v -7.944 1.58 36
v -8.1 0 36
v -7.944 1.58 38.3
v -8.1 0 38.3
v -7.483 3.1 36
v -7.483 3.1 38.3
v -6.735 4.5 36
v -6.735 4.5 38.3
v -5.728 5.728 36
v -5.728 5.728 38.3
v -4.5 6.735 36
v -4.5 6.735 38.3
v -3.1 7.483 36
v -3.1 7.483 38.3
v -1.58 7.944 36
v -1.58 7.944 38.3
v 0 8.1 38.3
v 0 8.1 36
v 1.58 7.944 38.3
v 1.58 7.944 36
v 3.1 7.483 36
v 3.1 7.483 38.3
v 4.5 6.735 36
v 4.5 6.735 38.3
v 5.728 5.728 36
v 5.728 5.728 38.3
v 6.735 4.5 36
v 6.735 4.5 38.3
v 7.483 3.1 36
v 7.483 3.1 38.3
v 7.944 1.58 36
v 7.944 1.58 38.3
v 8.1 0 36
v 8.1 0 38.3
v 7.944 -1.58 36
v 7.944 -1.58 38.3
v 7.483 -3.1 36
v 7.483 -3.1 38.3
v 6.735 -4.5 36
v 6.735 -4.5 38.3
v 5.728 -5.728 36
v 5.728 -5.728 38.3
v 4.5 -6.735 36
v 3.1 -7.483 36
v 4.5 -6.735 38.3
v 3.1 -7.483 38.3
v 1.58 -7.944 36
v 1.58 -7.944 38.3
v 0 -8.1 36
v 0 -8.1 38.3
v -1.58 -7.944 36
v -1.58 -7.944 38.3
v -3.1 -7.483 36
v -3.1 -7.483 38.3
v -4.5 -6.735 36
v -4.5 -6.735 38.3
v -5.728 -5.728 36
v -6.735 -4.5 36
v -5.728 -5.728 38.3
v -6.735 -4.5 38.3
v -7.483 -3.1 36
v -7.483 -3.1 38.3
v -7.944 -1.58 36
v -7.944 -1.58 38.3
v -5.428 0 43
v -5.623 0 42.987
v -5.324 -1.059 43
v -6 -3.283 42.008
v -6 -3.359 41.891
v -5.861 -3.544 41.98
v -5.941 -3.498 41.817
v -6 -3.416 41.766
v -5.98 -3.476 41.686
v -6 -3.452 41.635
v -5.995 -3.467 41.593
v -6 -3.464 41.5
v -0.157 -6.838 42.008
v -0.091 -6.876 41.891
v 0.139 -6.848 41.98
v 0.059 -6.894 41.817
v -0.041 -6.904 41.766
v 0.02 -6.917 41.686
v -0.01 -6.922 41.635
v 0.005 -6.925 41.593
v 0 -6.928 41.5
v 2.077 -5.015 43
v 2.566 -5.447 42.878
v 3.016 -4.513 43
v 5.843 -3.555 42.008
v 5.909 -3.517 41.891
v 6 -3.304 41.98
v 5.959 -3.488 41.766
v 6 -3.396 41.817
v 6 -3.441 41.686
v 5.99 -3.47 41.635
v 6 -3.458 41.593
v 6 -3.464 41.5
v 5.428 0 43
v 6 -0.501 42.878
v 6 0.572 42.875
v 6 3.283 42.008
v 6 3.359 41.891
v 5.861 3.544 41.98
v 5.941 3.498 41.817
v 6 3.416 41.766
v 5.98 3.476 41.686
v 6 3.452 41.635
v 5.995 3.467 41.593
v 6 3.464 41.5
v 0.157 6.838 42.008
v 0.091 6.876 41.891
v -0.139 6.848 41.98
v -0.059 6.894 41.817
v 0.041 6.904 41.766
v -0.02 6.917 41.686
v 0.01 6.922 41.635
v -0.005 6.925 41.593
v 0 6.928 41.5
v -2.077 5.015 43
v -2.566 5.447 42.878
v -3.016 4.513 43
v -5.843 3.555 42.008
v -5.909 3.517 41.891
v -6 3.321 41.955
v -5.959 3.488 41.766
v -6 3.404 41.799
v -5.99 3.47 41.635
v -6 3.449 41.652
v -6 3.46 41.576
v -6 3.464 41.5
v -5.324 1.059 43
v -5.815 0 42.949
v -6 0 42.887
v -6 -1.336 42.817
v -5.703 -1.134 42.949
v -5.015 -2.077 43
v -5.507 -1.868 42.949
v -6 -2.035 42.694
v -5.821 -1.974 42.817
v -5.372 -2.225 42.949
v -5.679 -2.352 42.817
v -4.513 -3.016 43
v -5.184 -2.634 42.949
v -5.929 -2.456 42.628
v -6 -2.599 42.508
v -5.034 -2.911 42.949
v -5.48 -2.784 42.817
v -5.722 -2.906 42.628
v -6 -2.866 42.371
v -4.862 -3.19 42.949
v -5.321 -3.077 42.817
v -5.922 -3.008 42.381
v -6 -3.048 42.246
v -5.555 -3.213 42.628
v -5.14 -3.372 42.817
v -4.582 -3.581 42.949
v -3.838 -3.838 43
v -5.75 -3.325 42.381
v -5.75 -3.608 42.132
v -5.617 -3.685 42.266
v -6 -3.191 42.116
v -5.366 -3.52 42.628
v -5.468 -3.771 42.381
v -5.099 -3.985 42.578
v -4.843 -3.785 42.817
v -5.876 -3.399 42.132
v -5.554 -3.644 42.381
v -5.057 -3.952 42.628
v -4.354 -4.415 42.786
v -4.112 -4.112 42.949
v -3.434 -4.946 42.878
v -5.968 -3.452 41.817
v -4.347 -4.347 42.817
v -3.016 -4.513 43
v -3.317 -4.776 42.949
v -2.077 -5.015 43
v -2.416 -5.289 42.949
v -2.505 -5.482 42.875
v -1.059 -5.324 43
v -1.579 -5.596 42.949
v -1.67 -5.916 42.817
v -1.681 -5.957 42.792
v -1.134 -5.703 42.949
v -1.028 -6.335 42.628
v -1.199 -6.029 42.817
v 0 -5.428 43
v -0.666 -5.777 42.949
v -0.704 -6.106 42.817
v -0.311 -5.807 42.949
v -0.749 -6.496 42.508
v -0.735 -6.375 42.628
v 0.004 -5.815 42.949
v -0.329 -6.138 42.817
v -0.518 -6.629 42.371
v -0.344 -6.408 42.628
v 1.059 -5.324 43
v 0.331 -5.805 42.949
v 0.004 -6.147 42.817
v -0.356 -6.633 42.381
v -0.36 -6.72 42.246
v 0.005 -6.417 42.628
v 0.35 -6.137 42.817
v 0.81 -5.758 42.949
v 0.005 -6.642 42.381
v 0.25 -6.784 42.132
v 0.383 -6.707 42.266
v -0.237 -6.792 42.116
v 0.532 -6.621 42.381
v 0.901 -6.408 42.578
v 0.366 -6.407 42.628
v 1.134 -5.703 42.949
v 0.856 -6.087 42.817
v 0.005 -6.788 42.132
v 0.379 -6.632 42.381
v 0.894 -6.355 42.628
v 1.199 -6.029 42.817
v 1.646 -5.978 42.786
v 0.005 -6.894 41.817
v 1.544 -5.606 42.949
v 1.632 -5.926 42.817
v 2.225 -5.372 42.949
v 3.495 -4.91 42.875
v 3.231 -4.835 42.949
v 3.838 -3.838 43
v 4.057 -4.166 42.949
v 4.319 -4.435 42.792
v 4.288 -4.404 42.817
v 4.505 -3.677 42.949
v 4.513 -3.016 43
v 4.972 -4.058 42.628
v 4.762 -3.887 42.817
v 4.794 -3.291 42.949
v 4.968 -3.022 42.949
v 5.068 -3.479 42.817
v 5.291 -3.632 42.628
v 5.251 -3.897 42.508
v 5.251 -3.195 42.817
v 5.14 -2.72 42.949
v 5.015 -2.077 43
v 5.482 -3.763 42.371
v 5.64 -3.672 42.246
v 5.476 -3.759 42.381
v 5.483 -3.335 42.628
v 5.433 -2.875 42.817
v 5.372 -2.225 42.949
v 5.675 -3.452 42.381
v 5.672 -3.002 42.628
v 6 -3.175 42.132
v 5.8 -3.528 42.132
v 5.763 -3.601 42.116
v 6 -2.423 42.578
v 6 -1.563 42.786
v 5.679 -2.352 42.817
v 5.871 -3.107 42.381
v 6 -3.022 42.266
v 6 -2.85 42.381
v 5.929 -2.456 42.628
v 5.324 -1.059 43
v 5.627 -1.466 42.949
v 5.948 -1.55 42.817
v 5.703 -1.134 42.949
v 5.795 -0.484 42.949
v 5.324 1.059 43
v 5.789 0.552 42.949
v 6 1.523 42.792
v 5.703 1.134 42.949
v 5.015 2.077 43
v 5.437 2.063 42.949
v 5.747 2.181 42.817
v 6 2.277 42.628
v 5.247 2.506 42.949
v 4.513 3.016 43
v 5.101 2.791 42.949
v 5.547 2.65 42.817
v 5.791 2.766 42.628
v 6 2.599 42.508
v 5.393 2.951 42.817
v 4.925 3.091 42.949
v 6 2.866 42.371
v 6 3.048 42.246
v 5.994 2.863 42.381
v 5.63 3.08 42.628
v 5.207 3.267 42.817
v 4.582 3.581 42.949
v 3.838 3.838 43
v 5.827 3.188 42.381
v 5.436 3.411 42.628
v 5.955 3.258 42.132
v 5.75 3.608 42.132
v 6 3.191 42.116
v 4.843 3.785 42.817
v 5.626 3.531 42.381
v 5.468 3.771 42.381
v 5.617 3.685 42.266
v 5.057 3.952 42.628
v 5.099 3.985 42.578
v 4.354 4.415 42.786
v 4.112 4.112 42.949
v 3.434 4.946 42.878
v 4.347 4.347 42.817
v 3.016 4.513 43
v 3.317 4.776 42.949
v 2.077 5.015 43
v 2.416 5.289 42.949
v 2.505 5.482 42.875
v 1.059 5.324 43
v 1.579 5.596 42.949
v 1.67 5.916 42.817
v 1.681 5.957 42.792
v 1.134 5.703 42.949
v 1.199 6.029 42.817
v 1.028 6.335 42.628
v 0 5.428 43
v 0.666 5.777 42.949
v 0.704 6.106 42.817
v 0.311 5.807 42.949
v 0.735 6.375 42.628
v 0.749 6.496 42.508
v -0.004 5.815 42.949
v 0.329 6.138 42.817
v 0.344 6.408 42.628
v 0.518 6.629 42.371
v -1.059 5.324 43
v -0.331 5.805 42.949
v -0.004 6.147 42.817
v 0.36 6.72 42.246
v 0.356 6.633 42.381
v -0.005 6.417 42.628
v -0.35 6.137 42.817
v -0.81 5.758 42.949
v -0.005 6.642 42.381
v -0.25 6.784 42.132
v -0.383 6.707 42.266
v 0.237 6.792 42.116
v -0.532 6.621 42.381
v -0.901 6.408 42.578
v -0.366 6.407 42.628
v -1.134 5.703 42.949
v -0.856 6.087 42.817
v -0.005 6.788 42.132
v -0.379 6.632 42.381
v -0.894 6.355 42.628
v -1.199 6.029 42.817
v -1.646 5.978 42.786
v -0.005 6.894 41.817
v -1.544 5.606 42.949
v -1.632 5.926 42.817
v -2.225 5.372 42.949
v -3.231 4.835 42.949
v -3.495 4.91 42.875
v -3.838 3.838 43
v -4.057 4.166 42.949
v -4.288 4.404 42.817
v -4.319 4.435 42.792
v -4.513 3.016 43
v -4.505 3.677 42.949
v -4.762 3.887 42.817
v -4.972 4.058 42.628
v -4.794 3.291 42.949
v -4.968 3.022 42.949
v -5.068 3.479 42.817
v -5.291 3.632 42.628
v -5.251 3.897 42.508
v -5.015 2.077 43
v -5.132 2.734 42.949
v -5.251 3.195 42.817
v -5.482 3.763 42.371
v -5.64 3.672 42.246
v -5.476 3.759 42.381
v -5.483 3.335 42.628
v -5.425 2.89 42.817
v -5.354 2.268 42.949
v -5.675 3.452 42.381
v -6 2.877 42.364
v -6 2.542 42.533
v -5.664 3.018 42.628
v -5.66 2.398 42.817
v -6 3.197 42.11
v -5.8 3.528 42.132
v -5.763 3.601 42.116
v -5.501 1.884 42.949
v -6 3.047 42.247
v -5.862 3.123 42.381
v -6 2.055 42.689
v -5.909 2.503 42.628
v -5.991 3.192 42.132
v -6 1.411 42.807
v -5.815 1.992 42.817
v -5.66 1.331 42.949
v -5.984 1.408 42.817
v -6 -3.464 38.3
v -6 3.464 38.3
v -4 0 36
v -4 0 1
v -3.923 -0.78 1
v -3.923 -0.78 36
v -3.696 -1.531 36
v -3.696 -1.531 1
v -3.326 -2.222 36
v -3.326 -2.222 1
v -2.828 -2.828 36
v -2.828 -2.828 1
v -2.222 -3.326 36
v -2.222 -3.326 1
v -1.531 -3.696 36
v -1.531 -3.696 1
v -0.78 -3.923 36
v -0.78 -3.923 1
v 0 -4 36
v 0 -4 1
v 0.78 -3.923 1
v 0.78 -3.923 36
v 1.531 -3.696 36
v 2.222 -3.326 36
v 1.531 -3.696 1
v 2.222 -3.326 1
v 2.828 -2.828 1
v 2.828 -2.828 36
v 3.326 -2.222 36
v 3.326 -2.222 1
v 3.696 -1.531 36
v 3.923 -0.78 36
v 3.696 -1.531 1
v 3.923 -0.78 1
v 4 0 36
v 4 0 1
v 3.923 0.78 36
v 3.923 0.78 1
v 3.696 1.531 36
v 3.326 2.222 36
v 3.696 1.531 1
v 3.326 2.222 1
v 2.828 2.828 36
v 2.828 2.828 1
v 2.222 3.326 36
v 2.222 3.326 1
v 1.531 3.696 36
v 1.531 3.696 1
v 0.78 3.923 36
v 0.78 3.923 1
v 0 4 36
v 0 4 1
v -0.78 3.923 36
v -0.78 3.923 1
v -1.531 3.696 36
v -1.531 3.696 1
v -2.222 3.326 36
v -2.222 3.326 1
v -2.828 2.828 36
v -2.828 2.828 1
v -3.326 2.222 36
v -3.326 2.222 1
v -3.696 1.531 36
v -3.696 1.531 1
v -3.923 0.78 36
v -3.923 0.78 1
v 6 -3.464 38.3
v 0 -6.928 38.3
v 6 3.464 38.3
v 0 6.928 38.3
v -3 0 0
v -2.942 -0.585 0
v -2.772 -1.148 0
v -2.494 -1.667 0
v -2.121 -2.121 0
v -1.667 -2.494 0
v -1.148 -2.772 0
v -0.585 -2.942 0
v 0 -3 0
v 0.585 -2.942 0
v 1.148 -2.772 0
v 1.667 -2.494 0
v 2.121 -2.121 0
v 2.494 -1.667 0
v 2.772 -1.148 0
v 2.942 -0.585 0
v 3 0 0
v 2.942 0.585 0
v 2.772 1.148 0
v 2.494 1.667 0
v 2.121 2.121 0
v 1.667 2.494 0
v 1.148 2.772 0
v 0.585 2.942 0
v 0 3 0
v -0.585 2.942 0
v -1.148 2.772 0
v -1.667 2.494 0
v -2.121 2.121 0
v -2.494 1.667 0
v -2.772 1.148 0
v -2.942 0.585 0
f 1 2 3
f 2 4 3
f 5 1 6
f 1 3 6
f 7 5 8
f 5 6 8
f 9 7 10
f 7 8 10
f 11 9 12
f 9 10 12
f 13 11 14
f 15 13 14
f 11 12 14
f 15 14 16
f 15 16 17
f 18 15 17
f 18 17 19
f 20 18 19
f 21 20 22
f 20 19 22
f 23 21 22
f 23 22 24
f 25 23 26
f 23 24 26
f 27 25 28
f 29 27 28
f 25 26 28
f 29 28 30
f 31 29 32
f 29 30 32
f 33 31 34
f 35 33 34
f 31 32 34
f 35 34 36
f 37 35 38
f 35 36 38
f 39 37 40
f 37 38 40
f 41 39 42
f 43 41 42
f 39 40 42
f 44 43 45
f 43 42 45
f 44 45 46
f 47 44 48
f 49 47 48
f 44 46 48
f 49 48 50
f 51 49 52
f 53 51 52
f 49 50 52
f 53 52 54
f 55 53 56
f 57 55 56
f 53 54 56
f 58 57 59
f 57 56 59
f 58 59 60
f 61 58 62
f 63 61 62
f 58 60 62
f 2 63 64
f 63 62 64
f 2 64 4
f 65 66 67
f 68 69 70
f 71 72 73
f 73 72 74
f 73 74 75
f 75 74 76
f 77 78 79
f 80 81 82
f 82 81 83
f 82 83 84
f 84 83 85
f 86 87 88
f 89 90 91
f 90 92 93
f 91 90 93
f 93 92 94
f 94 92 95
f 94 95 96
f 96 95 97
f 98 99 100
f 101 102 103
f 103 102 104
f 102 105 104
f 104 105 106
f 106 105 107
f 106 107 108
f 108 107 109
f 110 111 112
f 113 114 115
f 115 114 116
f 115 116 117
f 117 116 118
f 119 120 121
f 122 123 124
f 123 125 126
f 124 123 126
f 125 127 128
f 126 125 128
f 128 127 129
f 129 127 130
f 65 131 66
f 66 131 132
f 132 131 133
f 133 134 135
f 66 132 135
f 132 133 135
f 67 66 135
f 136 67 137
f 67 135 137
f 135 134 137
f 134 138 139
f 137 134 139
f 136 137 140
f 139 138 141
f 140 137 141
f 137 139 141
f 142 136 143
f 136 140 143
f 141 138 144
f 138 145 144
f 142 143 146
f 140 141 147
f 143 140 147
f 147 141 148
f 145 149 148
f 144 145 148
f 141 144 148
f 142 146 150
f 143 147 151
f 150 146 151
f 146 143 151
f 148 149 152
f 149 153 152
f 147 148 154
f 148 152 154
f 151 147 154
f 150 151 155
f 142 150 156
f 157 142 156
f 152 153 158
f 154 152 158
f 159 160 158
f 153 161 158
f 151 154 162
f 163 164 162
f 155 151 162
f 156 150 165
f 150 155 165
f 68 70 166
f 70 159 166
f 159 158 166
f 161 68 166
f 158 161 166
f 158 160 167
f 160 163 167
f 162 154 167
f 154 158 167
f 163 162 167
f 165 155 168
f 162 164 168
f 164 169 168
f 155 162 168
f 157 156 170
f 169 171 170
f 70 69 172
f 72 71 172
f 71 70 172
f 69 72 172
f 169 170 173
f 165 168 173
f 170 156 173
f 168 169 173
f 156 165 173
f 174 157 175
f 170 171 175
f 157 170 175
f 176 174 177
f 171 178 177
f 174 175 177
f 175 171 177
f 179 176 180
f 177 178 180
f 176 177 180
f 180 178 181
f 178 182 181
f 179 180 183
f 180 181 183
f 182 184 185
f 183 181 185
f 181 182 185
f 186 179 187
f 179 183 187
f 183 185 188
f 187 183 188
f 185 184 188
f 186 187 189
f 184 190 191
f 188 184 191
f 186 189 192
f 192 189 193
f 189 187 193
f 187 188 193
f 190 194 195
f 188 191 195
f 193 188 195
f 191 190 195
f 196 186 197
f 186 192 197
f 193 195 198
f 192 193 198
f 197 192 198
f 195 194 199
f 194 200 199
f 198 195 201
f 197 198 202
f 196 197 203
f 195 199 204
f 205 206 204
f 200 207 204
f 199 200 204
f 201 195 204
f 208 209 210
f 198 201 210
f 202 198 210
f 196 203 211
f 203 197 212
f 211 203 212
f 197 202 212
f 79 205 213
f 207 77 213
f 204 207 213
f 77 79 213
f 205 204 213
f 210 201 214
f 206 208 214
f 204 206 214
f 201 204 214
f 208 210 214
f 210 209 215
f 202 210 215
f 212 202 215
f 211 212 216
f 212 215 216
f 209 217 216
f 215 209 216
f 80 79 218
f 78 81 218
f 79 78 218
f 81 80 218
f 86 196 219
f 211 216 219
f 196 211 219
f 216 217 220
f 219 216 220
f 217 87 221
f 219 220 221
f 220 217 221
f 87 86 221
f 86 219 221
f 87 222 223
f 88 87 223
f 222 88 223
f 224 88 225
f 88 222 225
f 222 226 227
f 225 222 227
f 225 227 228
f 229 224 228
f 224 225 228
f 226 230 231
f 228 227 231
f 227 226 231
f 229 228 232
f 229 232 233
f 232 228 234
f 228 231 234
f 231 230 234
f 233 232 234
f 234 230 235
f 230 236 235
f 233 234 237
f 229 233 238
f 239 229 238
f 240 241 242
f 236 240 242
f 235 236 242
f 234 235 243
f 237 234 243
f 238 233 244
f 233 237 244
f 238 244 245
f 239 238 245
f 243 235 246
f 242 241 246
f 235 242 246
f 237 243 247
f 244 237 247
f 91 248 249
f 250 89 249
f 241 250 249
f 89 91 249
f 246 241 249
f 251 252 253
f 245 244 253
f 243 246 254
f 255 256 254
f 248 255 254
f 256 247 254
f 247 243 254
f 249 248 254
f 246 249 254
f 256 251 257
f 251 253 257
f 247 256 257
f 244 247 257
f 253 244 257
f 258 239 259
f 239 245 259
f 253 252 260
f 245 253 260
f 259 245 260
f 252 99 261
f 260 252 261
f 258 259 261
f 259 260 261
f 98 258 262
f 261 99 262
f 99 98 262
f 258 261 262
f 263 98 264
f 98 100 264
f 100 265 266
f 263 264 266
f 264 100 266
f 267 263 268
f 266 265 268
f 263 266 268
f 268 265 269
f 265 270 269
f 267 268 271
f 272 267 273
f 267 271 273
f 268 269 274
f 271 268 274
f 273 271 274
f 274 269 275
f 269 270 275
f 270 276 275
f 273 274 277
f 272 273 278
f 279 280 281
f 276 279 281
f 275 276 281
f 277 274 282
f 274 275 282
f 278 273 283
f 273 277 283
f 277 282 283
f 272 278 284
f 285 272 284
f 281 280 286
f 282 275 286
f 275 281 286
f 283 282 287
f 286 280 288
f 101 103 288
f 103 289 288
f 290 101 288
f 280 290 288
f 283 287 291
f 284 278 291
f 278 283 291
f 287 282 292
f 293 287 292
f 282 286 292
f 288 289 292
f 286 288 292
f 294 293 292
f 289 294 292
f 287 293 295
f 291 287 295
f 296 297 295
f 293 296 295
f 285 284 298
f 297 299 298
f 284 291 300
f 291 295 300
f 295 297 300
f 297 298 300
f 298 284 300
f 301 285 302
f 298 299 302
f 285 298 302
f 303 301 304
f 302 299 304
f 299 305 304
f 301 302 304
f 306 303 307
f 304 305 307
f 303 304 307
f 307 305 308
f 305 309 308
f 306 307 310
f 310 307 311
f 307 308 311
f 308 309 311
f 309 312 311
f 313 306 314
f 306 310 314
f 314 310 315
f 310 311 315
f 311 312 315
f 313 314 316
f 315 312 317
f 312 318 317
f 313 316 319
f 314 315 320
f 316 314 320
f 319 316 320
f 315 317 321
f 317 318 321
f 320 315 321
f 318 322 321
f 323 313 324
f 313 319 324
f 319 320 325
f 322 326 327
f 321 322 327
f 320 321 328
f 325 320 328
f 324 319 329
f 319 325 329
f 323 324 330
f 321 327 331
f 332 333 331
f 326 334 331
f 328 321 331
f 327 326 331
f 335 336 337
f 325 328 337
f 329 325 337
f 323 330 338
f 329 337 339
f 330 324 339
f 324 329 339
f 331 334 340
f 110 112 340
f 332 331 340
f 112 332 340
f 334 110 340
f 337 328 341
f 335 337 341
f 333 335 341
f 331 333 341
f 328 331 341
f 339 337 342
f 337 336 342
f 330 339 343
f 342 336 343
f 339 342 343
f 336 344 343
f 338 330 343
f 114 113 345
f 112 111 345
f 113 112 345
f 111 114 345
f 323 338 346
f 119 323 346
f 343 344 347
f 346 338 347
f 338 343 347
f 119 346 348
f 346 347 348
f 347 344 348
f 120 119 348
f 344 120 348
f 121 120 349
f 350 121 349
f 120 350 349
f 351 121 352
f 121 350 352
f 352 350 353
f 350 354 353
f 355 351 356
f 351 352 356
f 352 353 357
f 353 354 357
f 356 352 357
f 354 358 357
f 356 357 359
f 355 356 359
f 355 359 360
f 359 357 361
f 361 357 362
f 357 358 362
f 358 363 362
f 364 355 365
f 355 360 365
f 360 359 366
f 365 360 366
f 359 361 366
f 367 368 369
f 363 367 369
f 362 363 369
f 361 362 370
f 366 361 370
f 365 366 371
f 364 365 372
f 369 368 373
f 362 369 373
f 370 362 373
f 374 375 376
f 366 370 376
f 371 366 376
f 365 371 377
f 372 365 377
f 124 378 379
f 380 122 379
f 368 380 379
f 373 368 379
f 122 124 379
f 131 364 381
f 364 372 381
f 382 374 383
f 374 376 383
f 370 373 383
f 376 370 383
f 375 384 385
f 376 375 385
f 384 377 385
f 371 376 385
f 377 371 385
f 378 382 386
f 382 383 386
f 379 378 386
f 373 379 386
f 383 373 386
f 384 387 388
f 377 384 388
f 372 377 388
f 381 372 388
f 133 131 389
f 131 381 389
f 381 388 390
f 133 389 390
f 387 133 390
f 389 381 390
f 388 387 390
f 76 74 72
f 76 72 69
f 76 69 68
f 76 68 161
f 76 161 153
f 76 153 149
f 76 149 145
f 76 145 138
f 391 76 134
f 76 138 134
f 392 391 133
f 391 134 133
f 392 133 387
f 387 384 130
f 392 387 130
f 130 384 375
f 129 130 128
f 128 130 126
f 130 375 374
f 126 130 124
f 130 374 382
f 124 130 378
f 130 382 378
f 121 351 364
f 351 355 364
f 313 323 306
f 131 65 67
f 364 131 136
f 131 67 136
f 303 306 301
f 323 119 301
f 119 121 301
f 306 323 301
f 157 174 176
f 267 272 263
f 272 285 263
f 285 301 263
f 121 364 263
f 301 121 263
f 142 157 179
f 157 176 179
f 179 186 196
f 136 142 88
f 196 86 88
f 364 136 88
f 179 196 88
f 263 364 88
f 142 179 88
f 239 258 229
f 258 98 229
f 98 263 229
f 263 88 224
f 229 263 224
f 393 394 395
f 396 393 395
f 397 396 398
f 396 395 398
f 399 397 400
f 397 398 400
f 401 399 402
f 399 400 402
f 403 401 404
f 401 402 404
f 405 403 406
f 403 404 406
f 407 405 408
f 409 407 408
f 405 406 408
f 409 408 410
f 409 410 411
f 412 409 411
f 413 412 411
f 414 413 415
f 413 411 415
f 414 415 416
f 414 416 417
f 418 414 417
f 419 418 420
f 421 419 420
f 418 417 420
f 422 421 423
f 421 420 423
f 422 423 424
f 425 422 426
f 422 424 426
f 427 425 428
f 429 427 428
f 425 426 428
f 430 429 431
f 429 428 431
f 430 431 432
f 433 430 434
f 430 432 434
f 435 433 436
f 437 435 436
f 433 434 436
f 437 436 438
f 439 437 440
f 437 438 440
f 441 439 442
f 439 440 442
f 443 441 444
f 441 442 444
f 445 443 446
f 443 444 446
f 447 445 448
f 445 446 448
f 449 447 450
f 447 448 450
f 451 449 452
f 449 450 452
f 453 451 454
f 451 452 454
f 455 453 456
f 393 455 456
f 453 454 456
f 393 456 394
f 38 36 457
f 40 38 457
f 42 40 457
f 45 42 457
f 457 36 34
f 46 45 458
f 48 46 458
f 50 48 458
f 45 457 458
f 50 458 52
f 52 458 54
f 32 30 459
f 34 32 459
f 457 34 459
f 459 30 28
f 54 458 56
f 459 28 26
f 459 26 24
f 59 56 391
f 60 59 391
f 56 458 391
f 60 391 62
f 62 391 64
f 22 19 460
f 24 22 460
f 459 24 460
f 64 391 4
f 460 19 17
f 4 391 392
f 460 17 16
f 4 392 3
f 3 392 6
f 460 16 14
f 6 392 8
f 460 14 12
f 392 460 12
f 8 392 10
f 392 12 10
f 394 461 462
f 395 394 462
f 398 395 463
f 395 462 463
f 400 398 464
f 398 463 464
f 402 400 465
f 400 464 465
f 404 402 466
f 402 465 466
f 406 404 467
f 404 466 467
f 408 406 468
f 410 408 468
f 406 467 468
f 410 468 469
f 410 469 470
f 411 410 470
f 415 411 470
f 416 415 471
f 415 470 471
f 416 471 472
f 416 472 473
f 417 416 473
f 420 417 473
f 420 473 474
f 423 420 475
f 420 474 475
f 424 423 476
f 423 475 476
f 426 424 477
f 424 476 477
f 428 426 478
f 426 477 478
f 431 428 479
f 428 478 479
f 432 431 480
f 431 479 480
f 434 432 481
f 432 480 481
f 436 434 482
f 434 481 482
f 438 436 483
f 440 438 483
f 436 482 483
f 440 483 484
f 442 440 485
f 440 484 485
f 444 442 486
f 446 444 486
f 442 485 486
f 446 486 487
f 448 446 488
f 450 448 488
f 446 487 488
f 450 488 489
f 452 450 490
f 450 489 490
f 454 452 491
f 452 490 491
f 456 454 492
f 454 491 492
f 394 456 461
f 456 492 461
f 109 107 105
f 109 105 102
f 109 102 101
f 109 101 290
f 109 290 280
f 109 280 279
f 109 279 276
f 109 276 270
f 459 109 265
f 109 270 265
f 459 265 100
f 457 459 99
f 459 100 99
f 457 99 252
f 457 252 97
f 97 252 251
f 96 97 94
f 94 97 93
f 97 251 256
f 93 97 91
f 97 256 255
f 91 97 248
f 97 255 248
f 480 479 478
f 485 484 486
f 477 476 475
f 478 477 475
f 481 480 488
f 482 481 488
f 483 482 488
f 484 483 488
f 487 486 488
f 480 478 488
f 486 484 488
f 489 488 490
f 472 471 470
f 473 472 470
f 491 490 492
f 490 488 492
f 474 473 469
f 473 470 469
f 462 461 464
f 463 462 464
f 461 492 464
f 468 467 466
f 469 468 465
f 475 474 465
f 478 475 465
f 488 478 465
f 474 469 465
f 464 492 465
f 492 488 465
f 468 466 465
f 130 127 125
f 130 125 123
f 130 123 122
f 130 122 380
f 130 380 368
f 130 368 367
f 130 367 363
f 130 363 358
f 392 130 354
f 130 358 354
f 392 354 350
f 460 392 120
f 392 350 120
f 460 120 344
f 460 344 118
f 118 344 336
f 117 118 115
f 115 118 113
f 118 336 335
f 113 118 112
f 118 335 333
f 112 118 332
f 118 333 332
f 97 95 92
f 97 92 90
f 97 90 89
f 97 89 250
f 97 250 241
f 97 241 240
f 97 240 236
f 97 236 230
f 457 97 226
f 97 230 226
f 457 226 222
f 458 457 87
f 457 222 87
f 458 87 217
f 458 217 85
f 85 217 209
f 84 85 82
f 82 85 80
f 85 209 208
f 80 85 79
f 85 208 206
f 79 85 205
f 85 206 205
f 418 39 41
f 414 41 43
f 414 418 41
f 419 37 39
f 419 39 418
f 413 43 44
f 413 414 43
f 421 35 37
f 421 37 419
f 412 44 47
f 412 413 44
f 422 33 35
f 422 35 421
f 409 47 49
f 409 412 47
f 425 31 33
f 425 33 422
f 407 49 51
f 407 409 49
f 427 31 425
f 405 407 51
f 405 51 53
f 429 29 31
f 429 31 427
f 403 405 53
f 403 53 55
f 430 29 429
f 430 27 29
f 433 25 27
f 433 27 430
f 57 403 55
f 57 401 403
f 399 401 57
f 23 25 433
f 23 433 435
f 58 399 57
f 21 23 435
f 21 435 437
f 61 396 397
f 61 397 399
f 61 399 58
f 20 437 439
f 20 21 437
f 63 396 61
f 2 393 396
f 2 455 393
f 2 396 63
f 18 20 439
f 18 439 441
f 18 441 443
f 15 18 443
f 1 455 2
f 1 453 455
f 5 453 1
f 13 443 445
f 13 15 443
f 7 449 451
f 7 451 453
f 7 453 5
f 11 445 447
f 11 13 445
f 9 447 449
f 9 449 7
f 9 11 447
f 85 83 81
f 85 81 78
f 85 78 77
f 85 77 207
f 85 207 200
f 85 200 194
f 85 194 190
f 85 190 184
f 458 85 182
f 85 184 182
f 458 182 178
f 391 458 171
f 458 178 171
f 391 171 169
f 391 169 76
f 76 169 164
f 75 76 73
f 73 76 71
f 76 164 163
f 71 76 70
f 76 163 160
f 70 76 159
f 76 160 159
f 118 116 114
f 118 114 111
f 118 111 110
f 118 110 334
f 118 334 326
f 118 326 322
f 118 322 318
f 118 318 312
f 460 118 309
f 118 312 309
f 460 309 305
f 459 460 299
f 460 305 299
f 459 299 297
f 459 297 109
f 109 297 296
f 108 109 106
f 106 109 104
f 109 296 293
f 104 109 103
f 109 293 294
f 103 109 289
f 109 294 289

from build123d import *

# Parameters (mm, degrees)
F2_R     = 1.5
F3_R     = 8
F4_DEPTH = 43.001
F5_W     = 8.1
F5_H     = 2.3
F7_SIZE  = 1


with BuildPart() as f1:
    # F0 (on Front) → F1 (revolve)
    with BuildSketch(Plane.XZ):
        Polygon((-4, 0), (0, 0), (0, 43), (-6.9282032303, 43), (-6.9282032303, 36), (-4, 36), align=None)
    revolve(axis=Axis((0, 0, 24.3542883545), (0, 0, 1)))

    # F2
    f2_edges = [f1.edges().sort_by_distance(p)[0] for p in [
        (6.928203, 0, 43),
    ]]
    fillet(f2_edges, radius=F2_R)

    # F3 (on face) → F4 (cut, through all)
    with BuildSketch(Plane.XY.offset(43)):
        Circle(F3_R)
        Polygon((0, -6.9282032303), (-6, -3.4641016151), (-6, 3.4641016151), (0, 6.9282032303), (6, 3.4641016151), (6, -3.4641016151), align=None, mode=Mode.SUBTRACT)
    extrude(amount=-F4_DEPTH, mode=Mode.SUBTRACT)

    # F5 (on Front) → F6 (revolve)
    with BuildSketch(Plane.XZ):
        with Locations((-4.05, 37.15)):
            Rectangle(F5_W, F5_H)
    revolve(axis=Axis((0, 0, 29.9482884184), (0, 0, -1)))

    # F7
    f7_edges = [f1.edges().sort_by_distance(p)[0] for p in [
        (4, 0, 0),
    ]]
    chamfer(f7_edges, length=F7_SIZE)


solid = f1.part
